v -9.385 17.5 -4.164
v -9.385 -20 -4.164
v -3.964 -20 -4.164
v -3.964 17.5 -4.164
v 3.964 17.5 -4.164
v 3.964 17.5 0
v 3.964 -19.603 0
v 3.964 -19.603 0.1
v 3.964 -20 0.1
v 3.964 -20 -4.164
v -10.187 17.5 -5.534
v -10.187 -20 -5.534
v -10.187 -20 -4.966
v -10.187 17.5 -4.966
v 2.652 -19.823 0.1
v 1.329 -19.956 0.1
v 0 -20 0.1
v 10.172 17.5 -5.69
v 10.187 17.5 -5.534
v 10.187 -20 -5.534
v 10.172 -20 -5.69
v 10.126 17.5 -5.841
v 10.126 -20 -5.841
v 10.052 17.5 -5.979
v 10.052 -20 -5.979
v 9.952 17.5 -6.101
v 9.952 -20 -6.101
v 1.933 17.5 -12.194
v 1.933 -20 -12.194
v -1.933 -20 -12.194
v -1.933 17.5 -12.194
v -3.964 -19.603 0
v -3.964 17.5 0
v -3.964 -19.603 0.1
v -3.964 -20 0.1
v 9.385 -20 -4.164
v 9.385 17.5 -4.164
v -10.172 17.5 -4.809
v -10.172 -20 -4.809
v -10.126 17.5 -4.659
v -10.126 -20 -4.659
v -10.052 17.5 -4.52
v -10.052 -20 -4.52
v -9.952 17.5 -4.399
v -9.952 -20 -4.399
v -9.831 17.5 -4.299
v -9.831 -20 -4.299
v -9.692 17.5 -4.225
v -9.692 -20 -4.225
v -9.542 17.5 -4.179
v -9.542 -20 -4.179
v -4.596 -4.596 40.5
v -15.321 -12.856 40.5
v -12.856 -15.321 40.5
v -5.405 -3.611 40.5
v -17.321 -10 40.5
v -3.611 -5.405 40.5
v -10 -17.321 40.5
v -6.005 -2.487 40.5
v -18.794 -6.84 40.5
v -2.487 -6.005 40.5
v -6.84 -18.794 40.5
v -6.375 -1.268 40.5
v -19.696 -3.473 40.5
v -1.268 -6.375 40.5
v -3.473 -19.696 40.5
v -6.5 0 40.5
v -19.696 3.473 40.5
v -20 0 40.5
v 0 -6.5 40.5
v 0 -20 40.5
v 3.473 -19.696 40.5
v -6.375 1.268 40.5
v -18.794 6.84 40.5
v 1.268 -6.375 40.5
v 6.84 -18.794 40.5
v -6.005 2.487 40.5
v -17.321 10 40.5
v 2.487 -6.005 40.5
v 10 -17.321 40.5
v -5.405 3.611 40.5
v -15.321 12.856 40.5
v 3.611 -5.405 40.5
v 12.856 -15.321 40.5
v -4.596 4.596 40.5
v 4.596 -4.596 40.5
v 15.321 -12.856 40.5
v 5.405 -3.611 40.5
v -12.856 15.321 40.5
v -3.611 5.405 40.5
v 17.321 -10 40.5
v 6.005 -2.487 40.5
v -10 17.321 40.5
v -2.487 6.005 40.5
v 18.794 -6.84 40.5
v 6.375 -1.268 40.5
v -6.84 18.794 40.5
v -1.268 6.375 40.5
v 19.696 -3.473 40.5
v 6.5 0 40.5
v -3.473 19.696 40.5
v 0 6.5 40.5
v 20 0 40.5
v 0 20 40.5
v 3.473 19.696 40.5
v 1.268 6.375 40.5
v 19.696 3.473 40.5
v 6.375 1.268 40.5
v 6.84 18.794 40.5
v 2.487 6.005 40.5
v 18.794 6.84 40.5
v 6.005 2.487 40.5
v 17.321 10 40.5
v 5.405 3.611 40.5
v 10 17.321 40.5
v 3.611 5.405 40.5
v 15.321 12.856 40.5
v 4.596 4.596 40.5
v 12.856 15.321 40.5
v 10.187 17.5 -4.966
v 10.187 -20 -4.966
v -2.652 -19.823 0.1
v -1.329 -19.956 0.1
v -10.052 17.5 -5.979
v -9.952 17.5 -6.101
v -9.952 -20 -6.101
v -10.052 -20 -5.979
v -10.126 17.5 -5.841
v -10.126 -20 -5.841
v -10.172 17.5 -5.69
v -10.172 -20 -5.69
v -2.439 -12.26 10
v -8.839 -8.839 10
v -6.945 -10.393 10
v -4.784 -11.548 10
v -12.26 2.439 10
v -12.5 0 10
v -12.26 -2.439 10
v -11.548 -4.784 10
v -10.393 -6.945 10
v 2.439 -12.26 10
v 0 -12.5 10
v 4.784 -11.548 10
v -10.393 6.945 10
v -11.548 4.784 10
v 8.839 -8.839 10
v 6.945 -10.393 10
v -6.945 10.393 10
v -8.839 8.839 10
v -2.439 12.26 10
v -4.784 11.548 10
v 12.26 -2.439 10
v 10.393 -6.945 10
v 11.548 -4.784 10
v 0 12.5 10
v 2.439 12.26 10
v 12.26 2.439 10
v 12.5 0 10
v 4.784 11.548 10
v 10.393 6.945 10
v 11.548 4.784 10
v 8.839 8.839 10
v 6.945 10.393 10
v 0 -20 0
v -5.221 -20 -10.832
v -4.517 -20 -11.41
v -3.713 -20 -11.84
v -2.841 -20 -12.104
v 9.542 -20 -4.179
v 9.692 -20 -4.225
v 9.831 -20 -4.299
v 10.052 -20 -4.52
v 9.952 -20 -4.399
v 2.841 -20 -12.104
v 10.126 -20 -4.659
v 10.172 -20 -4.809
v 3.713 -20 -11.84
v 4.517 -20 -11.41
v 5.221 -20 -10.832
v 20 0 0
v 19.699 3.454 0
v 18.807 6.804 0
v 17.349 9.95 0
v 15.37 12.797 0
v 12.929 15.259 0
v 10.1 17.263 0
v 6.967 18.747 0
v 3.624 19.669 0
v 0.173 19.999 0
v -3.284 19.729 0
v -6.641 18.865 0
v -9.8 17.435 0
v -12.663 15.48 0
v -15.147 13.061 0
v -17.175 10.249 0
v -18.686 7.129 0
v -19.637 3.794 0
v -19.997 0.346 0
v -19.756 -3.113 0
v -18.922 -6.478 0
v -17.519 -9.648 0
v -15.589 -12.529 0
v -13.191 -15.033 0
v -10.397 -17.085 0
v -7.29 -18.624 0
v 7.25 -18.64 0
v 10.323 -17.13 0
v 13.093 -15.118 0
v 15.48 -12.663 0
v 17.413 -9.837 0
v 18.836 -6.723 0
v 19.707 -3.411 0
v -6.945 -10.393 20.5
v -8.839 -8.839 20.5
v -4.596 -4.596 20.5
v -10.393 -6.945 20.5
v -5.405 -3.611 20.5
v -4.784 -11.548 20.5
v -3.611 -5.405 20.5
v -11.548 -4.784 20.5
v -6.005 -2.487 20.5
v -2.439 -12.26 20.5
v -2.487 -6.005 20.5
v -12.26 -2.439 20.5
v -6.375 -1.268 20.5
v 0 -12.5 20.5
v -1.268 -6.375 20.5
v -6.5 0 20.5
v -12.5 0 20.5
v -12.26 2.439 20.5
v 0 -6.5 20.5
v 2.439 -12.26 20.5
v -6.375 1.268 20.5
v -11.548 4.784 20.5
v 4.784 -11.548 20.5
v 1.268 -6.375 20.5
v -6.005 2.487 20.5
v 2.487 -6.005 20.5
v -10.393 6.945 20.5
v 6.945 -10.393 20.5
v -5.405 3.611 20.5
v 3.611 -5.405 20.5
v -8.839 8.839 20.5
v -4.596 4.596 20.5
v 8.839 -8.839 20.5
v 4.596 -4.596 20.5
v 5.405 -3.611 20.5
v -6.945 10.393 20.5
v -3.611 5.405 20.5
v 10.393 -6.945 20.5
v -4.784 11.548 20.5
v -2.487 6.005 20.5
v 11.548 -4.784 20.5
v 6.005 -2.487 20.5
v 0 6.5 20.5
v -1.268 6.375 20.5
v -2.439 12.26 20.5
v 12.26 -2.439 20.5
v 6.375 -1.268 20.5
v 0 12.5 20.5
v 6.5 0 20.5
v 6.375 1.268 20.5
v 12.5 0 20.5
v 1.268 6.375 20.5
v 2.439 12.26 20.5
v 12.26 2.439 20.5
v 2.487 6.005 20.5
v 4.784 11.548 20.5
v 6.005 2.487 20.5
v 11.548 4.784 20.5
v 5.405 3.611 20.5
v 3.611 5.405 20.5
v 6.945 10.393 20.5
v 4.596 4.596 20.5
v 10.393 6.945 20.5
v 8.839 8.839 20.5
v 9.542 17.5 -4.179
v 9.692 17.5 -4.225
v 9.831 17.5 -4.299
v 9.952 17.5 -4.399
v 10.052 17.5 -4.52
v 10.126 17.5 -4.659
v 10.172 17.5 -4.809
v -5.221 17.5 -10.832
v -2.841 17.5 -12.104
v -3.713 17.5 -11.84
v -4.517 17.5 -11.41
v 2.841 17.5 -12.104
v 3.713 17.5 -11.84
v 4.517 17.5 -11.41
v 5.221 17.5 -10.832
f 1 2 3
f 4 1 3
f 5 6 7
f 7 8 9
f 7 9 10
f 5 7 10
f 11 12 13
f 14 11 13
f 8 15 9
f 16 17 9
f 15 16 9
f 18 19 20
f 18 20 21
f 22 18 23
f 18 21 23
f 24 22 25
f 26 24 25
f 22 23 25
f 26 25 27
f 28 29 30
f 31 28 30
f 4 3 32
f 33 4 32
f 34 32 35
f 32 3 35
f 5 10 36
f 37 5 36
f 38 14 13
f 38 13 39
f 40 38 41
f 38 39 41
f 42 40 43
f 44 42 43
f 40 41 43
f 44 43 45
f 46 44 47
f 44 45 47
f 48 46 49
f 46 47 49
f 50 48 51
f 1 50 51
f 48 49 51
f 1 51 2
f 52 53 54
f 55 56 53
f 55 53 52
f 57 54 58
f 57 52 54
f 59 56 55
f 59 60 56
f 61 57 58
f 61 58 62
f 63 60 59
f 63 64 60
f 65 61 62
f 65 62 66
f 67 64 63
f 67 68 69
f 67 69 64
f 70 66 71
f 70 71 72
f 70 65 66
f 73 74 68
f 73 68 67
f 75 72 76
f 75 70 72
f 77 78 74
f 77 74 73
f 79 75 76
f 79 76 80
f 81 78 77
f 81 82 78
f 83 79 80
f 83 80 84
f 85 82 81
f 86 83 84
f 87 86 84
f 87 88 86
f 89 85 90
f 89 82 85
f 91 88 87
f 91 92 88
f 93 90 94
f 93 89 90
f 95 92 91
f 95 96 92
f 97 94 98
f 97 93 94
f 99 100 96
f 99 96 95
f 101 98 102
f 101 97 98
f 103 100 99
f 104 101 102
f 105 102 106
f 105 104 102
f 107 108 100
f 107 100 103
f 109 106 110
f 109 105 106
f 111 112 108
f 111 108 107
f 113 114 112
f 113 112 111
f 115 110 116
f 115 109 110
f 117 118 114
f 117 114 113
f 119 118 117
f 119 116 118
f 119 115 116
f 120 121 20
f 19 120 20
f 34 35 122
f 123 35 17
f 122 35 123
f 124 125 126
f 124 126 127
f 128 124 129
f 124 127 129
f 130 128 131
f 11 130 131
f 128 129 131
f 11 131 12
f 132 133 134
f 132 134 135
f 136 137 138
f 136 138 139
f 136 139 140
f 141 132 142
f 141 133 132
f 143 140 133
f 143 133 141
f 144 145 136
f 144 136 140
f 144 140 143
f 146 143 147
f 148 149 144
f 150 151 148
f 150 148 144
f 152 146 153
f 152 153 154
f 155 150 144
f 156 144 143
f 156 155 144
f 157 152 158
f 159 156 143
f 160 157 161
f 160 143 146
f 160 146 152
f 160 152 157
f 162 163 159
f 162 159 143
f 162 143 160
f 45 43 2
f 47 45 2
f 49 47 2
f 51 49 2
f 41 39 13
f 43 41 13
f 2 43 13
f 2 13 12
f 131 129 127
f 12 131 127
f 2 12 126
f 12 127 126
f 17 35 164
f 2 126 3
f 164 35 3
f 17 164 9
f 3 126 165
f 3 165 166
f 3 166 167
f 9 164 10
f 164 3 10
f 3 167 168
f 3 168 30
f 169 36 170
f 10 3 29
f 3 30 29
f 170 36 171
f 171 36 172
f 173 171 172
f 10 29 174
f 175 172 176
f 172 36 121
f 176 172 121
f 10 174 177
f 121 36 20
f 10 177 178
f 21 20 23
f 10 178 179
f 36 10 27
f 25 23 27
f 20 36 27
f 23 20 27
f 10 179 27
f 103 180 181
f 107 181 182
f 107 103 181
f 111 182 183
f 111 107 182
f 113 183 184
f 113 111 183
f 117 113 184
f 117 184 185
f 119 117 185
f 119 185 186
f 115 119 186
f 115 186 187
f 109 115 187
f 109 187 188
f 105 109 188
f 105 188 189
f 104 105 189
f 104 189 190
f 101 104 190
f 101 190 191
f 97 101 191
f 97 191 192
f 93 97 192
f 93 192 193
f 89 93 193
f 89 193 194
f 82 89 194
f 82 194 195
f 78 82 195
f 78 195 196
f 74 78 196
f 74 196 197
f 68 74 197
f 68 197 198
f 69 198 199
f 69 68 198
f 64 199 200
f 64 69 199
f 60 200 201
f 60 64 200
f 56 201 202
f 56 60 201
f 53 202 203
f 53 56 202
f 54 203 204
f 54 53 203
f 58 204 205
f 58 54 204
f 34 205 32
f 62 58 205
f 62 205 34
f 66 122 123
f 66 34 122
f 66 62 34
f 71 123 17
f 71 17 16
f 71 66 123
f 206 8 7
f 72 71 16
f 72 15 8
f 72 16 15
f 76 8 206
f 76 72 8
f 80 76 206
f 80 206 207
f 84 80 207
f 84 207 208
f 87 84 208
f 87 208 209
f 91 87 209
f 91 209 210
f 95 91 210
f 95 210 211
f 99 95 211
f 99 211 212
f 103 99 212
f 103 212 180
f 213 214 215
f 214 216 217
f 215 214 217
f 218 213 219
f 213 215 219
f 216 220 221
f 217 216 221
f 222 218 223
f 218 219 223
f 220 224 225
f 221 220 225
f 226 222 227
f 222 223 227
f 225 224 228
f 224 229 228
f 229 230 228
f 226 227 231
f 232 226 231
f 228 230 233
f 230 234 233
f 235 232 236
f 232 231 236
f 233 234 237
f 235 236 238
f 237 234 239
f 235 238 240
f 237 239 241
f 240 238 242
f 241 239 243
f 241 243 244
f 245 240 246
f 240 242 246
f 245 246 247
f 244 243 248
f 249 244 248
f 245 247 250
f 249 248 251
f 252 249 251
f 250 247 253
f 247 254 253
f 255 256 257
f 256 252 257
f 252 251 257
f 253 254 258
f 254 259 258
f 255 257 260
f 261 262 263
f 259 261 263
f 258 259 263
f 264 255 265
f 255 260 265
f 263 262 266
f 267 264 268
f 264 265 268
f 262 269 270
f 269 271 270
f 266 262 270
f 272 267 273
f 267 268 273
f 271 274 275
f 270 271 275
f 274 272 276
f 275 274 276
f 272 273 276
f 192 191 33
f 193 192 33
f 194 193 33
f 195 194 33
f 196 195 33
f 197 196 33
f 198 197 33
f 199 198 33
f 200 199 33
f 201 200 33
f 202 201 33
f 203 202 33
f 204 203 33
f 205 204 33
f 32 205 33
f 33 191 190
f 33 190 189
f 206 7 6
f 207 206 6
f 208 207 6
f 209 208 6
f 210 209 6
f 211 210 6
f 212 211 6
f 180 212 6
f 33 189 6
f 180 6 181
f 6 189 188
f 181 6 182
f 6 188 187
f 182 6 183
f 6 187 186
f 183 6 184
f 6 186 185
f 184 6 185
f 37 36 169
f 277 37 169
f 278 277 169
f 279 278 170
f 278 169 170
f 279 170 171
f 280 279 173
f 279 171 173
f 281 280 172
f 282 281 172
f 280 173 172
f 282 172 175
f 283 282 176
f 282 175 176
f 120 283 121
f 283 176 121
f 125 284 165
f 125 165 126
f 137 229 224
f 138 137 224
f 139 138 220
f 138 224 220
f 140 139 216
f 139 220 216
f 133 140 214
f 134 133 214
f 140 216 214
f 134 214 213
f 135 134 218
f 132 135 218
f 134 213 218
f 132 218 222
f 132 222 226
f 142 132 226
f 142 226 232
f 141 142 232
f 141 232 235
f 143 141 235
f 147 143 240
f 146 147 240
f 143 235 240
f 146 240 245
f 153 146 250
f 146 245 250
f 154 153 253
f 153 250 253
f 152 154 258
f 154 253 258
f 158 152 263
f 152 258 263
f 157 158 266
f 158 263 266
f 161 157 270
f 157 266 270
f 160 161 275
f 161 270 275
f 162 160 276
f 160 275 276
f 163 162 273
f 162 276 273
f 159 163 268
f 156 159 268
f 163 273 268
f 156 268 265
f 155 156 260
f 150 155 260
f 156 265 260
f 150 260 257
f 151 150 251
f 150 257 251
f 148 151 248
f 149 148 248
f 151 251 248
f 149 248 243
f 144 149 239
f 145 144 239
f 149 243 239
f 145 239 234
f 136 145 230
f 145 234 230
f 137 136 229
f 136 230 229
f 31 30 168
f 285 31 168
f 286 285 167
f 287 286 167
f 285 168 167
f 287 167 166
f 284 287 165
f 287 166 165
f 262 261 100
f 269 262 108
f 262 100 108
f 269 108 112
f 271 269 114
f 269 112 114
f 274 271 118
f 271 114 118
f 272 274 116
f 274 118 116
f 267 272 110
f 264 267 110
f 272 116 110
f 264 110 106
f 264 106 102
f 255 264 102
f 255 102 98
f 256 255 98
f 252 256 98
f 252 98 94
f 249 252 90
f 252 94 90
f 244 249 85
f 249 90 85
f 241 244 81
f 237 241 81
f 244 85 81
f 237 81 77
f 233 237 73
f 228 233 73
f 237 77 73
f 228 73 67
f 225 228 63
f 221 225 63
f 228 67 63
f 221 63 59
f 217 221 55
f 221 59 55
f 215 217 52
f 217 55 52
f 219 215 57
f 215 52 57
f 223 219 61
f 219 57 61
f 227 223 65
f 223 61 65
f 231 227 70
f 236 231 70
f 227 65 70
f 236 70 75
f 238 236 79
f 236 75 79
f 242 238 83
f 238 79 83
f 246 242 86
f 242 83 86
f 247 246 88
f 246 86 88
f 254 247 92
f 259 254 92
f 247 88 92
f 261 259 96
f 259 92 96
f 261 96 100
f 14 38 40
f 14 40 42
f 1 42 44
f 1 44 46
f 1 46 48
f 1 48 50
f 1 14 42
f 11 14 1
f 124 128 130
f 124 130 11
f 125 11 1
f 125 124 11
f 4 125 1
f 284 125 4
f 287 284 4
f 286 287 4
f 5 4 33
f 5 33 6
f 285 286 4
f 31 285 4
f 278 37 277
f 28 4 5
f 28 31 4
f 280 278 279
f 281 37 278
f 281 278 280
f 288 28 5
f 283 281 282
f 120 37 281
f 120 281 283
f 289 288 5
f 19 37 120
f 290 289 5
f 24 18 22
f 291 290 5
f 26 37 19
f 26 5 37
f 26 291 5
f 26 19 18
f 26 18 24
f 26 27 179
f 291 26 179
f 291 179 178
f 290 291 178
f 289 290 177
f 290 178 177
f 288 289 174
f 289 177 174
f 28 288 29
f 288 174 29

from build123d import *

# Parameters (mm, degrees)
BOSS_EXTRUDE1_DEPTH      = 17.5
BOSS_EXTRUDE1_DEPTH_BACK = 20
BOSS_EXTRUDE2_DEPTH      = 5
BOSS_EXTRUDE2_DEPTH_BACK = 5
SKETCH4_R                = 20
BOSS_EXTRUDE3_START      = 10.5
SKETCH5_R                = 20
SKETCH5_R_2              = 12.5
BOSS_EXTRUDE3_DEPTH      = 10.5
BOSS_EXTRUDE4_START      = 20
SKETCH6_R                = 20
SKETCH6_R_2              = 6.5
BOSS_EXTRUDE4_DEPTH      = 20


with BuildPart() as part:
    # Sketch3 → Boss-Extrude1 (new, two sides: drawn at the far end of the back side and taken through both)
    with BuildSketch(Plane(origin=(0, 0, 0), x_dir=(1, 0, 0), z_dir=(0, 1, 0)).offset(-BOSS_EXTRUDE1_DEPTH_BACK)):
        with BuildLine():
            Line((-9.385342517, 4.164), (-5.617617549, 4.164))
            Line((-5.617617549, 4.164), (-3.964, 4.164))
            Line((-3.964, 4.164), (-3.964, 2.510382451))
            Line((-3.964, 2.510382451), (-3.964, 1.553617549))
            Line((-3.964, 1.553617549), (-3.964, -0.1))
            Line((-3.964, -0.1), (3.964, -0.1))
            Line((3.964, -0.1), (3.964, 1.553617549))
            Line((3.964, 1.553617549), (3.964, 2.510382451))
            Line((3.964, 2.510382451), (3.964, 4.164))
            Line((3.964, 4.164), (5.617617549, 4.164))
            Line((5.617617549, 4.164), (9.385342517, 4.164))
            ThreePointArc((9.385342517, 4.164), (9.952230024, 4.398812494), (10.187042517, 4.9657))
            Line((10.187042517, 4.9657), (10.187042517, 5.533957912))
            ThreePointArc((10.187042517, 5.533957912), (10.12601655, 5.840755675), (9.952229326, 6.100846116))
            Line((9.952229326, 6.100846116), (5.221354652, 10.831709155))
            ThreePointArc((5.221354652, 10.831709155), (3.712852366, 11.839656144), (1.933453584, 12.1936))
            Line((1.933453584, 12.1936), (-1.933453584, 12.1936))
            ThreePointArc((-1.933453584, 12.1936), (-3.712852366, 11.839656144), (-5.221354652, 10.831709155))
            Line((-5.221354652, 10.831709155), (-9.952229326, 6.100846116))
            ThreePointArc((-9.952229326, 6.100846116), (-10.12601655, 5.840755675), (-10.187042517, 5.533957912))
            Line((-10.187042517, 5.533957912), (-10.187042517, 4.9657))
            ThreePointArc((-10.187042517, 4.9657), (-9.952230024, 4.398812494), (-9.385342517, 4.164))
        make_face()
    extrude(amount=BOSS_EXTRUDE1_DEPTH + BOSS_EXTRUDE1_DEPTH_BACK)

    # Sketch4 → Boss-Extrude2 (add, two sides: drawn at the far end of the back side and taken through both)
    with BuildSketch(Plane.XY.offset(5).offset(-BOSS_EXTRUDE2_DEPTH_BACK)):
        Circle(SKETCH4_R)
    extrude(amount=BOSS_EXTRUDE2_DEPTH + BOSS_EXTRUDE2_DEPTH_BACK)

    # Sketch5 → Boss-Extrude3 (add)
    with BuildSketch(Plane.XY.offset(10).offset(BOSS_EXTRUDE3_START)):
        Circle(SKETCH5_R)
        with Locations(Location((0, 0, 0), (0, 0, 180))):
            Circle(SKETCH5_R_2, mode=Mode.SUBTRACT)
    extrude(amount=-BOSS_EXTRUDE3_DEPTH)

    # Sketch6 → Boss-Extrude4 (add)
    with BuildSketch(Plane.XY.offset(20.5).offset(BOSS_EXTRUDE4_START)):
        Circle(SKETCH6_R)
        Circle(SKETCH6_R_2, mode=Mode.SUBTRACT)
    extrude(amount=-BOSS_EXTRUDE4_DEPTH)


solid = part.part
